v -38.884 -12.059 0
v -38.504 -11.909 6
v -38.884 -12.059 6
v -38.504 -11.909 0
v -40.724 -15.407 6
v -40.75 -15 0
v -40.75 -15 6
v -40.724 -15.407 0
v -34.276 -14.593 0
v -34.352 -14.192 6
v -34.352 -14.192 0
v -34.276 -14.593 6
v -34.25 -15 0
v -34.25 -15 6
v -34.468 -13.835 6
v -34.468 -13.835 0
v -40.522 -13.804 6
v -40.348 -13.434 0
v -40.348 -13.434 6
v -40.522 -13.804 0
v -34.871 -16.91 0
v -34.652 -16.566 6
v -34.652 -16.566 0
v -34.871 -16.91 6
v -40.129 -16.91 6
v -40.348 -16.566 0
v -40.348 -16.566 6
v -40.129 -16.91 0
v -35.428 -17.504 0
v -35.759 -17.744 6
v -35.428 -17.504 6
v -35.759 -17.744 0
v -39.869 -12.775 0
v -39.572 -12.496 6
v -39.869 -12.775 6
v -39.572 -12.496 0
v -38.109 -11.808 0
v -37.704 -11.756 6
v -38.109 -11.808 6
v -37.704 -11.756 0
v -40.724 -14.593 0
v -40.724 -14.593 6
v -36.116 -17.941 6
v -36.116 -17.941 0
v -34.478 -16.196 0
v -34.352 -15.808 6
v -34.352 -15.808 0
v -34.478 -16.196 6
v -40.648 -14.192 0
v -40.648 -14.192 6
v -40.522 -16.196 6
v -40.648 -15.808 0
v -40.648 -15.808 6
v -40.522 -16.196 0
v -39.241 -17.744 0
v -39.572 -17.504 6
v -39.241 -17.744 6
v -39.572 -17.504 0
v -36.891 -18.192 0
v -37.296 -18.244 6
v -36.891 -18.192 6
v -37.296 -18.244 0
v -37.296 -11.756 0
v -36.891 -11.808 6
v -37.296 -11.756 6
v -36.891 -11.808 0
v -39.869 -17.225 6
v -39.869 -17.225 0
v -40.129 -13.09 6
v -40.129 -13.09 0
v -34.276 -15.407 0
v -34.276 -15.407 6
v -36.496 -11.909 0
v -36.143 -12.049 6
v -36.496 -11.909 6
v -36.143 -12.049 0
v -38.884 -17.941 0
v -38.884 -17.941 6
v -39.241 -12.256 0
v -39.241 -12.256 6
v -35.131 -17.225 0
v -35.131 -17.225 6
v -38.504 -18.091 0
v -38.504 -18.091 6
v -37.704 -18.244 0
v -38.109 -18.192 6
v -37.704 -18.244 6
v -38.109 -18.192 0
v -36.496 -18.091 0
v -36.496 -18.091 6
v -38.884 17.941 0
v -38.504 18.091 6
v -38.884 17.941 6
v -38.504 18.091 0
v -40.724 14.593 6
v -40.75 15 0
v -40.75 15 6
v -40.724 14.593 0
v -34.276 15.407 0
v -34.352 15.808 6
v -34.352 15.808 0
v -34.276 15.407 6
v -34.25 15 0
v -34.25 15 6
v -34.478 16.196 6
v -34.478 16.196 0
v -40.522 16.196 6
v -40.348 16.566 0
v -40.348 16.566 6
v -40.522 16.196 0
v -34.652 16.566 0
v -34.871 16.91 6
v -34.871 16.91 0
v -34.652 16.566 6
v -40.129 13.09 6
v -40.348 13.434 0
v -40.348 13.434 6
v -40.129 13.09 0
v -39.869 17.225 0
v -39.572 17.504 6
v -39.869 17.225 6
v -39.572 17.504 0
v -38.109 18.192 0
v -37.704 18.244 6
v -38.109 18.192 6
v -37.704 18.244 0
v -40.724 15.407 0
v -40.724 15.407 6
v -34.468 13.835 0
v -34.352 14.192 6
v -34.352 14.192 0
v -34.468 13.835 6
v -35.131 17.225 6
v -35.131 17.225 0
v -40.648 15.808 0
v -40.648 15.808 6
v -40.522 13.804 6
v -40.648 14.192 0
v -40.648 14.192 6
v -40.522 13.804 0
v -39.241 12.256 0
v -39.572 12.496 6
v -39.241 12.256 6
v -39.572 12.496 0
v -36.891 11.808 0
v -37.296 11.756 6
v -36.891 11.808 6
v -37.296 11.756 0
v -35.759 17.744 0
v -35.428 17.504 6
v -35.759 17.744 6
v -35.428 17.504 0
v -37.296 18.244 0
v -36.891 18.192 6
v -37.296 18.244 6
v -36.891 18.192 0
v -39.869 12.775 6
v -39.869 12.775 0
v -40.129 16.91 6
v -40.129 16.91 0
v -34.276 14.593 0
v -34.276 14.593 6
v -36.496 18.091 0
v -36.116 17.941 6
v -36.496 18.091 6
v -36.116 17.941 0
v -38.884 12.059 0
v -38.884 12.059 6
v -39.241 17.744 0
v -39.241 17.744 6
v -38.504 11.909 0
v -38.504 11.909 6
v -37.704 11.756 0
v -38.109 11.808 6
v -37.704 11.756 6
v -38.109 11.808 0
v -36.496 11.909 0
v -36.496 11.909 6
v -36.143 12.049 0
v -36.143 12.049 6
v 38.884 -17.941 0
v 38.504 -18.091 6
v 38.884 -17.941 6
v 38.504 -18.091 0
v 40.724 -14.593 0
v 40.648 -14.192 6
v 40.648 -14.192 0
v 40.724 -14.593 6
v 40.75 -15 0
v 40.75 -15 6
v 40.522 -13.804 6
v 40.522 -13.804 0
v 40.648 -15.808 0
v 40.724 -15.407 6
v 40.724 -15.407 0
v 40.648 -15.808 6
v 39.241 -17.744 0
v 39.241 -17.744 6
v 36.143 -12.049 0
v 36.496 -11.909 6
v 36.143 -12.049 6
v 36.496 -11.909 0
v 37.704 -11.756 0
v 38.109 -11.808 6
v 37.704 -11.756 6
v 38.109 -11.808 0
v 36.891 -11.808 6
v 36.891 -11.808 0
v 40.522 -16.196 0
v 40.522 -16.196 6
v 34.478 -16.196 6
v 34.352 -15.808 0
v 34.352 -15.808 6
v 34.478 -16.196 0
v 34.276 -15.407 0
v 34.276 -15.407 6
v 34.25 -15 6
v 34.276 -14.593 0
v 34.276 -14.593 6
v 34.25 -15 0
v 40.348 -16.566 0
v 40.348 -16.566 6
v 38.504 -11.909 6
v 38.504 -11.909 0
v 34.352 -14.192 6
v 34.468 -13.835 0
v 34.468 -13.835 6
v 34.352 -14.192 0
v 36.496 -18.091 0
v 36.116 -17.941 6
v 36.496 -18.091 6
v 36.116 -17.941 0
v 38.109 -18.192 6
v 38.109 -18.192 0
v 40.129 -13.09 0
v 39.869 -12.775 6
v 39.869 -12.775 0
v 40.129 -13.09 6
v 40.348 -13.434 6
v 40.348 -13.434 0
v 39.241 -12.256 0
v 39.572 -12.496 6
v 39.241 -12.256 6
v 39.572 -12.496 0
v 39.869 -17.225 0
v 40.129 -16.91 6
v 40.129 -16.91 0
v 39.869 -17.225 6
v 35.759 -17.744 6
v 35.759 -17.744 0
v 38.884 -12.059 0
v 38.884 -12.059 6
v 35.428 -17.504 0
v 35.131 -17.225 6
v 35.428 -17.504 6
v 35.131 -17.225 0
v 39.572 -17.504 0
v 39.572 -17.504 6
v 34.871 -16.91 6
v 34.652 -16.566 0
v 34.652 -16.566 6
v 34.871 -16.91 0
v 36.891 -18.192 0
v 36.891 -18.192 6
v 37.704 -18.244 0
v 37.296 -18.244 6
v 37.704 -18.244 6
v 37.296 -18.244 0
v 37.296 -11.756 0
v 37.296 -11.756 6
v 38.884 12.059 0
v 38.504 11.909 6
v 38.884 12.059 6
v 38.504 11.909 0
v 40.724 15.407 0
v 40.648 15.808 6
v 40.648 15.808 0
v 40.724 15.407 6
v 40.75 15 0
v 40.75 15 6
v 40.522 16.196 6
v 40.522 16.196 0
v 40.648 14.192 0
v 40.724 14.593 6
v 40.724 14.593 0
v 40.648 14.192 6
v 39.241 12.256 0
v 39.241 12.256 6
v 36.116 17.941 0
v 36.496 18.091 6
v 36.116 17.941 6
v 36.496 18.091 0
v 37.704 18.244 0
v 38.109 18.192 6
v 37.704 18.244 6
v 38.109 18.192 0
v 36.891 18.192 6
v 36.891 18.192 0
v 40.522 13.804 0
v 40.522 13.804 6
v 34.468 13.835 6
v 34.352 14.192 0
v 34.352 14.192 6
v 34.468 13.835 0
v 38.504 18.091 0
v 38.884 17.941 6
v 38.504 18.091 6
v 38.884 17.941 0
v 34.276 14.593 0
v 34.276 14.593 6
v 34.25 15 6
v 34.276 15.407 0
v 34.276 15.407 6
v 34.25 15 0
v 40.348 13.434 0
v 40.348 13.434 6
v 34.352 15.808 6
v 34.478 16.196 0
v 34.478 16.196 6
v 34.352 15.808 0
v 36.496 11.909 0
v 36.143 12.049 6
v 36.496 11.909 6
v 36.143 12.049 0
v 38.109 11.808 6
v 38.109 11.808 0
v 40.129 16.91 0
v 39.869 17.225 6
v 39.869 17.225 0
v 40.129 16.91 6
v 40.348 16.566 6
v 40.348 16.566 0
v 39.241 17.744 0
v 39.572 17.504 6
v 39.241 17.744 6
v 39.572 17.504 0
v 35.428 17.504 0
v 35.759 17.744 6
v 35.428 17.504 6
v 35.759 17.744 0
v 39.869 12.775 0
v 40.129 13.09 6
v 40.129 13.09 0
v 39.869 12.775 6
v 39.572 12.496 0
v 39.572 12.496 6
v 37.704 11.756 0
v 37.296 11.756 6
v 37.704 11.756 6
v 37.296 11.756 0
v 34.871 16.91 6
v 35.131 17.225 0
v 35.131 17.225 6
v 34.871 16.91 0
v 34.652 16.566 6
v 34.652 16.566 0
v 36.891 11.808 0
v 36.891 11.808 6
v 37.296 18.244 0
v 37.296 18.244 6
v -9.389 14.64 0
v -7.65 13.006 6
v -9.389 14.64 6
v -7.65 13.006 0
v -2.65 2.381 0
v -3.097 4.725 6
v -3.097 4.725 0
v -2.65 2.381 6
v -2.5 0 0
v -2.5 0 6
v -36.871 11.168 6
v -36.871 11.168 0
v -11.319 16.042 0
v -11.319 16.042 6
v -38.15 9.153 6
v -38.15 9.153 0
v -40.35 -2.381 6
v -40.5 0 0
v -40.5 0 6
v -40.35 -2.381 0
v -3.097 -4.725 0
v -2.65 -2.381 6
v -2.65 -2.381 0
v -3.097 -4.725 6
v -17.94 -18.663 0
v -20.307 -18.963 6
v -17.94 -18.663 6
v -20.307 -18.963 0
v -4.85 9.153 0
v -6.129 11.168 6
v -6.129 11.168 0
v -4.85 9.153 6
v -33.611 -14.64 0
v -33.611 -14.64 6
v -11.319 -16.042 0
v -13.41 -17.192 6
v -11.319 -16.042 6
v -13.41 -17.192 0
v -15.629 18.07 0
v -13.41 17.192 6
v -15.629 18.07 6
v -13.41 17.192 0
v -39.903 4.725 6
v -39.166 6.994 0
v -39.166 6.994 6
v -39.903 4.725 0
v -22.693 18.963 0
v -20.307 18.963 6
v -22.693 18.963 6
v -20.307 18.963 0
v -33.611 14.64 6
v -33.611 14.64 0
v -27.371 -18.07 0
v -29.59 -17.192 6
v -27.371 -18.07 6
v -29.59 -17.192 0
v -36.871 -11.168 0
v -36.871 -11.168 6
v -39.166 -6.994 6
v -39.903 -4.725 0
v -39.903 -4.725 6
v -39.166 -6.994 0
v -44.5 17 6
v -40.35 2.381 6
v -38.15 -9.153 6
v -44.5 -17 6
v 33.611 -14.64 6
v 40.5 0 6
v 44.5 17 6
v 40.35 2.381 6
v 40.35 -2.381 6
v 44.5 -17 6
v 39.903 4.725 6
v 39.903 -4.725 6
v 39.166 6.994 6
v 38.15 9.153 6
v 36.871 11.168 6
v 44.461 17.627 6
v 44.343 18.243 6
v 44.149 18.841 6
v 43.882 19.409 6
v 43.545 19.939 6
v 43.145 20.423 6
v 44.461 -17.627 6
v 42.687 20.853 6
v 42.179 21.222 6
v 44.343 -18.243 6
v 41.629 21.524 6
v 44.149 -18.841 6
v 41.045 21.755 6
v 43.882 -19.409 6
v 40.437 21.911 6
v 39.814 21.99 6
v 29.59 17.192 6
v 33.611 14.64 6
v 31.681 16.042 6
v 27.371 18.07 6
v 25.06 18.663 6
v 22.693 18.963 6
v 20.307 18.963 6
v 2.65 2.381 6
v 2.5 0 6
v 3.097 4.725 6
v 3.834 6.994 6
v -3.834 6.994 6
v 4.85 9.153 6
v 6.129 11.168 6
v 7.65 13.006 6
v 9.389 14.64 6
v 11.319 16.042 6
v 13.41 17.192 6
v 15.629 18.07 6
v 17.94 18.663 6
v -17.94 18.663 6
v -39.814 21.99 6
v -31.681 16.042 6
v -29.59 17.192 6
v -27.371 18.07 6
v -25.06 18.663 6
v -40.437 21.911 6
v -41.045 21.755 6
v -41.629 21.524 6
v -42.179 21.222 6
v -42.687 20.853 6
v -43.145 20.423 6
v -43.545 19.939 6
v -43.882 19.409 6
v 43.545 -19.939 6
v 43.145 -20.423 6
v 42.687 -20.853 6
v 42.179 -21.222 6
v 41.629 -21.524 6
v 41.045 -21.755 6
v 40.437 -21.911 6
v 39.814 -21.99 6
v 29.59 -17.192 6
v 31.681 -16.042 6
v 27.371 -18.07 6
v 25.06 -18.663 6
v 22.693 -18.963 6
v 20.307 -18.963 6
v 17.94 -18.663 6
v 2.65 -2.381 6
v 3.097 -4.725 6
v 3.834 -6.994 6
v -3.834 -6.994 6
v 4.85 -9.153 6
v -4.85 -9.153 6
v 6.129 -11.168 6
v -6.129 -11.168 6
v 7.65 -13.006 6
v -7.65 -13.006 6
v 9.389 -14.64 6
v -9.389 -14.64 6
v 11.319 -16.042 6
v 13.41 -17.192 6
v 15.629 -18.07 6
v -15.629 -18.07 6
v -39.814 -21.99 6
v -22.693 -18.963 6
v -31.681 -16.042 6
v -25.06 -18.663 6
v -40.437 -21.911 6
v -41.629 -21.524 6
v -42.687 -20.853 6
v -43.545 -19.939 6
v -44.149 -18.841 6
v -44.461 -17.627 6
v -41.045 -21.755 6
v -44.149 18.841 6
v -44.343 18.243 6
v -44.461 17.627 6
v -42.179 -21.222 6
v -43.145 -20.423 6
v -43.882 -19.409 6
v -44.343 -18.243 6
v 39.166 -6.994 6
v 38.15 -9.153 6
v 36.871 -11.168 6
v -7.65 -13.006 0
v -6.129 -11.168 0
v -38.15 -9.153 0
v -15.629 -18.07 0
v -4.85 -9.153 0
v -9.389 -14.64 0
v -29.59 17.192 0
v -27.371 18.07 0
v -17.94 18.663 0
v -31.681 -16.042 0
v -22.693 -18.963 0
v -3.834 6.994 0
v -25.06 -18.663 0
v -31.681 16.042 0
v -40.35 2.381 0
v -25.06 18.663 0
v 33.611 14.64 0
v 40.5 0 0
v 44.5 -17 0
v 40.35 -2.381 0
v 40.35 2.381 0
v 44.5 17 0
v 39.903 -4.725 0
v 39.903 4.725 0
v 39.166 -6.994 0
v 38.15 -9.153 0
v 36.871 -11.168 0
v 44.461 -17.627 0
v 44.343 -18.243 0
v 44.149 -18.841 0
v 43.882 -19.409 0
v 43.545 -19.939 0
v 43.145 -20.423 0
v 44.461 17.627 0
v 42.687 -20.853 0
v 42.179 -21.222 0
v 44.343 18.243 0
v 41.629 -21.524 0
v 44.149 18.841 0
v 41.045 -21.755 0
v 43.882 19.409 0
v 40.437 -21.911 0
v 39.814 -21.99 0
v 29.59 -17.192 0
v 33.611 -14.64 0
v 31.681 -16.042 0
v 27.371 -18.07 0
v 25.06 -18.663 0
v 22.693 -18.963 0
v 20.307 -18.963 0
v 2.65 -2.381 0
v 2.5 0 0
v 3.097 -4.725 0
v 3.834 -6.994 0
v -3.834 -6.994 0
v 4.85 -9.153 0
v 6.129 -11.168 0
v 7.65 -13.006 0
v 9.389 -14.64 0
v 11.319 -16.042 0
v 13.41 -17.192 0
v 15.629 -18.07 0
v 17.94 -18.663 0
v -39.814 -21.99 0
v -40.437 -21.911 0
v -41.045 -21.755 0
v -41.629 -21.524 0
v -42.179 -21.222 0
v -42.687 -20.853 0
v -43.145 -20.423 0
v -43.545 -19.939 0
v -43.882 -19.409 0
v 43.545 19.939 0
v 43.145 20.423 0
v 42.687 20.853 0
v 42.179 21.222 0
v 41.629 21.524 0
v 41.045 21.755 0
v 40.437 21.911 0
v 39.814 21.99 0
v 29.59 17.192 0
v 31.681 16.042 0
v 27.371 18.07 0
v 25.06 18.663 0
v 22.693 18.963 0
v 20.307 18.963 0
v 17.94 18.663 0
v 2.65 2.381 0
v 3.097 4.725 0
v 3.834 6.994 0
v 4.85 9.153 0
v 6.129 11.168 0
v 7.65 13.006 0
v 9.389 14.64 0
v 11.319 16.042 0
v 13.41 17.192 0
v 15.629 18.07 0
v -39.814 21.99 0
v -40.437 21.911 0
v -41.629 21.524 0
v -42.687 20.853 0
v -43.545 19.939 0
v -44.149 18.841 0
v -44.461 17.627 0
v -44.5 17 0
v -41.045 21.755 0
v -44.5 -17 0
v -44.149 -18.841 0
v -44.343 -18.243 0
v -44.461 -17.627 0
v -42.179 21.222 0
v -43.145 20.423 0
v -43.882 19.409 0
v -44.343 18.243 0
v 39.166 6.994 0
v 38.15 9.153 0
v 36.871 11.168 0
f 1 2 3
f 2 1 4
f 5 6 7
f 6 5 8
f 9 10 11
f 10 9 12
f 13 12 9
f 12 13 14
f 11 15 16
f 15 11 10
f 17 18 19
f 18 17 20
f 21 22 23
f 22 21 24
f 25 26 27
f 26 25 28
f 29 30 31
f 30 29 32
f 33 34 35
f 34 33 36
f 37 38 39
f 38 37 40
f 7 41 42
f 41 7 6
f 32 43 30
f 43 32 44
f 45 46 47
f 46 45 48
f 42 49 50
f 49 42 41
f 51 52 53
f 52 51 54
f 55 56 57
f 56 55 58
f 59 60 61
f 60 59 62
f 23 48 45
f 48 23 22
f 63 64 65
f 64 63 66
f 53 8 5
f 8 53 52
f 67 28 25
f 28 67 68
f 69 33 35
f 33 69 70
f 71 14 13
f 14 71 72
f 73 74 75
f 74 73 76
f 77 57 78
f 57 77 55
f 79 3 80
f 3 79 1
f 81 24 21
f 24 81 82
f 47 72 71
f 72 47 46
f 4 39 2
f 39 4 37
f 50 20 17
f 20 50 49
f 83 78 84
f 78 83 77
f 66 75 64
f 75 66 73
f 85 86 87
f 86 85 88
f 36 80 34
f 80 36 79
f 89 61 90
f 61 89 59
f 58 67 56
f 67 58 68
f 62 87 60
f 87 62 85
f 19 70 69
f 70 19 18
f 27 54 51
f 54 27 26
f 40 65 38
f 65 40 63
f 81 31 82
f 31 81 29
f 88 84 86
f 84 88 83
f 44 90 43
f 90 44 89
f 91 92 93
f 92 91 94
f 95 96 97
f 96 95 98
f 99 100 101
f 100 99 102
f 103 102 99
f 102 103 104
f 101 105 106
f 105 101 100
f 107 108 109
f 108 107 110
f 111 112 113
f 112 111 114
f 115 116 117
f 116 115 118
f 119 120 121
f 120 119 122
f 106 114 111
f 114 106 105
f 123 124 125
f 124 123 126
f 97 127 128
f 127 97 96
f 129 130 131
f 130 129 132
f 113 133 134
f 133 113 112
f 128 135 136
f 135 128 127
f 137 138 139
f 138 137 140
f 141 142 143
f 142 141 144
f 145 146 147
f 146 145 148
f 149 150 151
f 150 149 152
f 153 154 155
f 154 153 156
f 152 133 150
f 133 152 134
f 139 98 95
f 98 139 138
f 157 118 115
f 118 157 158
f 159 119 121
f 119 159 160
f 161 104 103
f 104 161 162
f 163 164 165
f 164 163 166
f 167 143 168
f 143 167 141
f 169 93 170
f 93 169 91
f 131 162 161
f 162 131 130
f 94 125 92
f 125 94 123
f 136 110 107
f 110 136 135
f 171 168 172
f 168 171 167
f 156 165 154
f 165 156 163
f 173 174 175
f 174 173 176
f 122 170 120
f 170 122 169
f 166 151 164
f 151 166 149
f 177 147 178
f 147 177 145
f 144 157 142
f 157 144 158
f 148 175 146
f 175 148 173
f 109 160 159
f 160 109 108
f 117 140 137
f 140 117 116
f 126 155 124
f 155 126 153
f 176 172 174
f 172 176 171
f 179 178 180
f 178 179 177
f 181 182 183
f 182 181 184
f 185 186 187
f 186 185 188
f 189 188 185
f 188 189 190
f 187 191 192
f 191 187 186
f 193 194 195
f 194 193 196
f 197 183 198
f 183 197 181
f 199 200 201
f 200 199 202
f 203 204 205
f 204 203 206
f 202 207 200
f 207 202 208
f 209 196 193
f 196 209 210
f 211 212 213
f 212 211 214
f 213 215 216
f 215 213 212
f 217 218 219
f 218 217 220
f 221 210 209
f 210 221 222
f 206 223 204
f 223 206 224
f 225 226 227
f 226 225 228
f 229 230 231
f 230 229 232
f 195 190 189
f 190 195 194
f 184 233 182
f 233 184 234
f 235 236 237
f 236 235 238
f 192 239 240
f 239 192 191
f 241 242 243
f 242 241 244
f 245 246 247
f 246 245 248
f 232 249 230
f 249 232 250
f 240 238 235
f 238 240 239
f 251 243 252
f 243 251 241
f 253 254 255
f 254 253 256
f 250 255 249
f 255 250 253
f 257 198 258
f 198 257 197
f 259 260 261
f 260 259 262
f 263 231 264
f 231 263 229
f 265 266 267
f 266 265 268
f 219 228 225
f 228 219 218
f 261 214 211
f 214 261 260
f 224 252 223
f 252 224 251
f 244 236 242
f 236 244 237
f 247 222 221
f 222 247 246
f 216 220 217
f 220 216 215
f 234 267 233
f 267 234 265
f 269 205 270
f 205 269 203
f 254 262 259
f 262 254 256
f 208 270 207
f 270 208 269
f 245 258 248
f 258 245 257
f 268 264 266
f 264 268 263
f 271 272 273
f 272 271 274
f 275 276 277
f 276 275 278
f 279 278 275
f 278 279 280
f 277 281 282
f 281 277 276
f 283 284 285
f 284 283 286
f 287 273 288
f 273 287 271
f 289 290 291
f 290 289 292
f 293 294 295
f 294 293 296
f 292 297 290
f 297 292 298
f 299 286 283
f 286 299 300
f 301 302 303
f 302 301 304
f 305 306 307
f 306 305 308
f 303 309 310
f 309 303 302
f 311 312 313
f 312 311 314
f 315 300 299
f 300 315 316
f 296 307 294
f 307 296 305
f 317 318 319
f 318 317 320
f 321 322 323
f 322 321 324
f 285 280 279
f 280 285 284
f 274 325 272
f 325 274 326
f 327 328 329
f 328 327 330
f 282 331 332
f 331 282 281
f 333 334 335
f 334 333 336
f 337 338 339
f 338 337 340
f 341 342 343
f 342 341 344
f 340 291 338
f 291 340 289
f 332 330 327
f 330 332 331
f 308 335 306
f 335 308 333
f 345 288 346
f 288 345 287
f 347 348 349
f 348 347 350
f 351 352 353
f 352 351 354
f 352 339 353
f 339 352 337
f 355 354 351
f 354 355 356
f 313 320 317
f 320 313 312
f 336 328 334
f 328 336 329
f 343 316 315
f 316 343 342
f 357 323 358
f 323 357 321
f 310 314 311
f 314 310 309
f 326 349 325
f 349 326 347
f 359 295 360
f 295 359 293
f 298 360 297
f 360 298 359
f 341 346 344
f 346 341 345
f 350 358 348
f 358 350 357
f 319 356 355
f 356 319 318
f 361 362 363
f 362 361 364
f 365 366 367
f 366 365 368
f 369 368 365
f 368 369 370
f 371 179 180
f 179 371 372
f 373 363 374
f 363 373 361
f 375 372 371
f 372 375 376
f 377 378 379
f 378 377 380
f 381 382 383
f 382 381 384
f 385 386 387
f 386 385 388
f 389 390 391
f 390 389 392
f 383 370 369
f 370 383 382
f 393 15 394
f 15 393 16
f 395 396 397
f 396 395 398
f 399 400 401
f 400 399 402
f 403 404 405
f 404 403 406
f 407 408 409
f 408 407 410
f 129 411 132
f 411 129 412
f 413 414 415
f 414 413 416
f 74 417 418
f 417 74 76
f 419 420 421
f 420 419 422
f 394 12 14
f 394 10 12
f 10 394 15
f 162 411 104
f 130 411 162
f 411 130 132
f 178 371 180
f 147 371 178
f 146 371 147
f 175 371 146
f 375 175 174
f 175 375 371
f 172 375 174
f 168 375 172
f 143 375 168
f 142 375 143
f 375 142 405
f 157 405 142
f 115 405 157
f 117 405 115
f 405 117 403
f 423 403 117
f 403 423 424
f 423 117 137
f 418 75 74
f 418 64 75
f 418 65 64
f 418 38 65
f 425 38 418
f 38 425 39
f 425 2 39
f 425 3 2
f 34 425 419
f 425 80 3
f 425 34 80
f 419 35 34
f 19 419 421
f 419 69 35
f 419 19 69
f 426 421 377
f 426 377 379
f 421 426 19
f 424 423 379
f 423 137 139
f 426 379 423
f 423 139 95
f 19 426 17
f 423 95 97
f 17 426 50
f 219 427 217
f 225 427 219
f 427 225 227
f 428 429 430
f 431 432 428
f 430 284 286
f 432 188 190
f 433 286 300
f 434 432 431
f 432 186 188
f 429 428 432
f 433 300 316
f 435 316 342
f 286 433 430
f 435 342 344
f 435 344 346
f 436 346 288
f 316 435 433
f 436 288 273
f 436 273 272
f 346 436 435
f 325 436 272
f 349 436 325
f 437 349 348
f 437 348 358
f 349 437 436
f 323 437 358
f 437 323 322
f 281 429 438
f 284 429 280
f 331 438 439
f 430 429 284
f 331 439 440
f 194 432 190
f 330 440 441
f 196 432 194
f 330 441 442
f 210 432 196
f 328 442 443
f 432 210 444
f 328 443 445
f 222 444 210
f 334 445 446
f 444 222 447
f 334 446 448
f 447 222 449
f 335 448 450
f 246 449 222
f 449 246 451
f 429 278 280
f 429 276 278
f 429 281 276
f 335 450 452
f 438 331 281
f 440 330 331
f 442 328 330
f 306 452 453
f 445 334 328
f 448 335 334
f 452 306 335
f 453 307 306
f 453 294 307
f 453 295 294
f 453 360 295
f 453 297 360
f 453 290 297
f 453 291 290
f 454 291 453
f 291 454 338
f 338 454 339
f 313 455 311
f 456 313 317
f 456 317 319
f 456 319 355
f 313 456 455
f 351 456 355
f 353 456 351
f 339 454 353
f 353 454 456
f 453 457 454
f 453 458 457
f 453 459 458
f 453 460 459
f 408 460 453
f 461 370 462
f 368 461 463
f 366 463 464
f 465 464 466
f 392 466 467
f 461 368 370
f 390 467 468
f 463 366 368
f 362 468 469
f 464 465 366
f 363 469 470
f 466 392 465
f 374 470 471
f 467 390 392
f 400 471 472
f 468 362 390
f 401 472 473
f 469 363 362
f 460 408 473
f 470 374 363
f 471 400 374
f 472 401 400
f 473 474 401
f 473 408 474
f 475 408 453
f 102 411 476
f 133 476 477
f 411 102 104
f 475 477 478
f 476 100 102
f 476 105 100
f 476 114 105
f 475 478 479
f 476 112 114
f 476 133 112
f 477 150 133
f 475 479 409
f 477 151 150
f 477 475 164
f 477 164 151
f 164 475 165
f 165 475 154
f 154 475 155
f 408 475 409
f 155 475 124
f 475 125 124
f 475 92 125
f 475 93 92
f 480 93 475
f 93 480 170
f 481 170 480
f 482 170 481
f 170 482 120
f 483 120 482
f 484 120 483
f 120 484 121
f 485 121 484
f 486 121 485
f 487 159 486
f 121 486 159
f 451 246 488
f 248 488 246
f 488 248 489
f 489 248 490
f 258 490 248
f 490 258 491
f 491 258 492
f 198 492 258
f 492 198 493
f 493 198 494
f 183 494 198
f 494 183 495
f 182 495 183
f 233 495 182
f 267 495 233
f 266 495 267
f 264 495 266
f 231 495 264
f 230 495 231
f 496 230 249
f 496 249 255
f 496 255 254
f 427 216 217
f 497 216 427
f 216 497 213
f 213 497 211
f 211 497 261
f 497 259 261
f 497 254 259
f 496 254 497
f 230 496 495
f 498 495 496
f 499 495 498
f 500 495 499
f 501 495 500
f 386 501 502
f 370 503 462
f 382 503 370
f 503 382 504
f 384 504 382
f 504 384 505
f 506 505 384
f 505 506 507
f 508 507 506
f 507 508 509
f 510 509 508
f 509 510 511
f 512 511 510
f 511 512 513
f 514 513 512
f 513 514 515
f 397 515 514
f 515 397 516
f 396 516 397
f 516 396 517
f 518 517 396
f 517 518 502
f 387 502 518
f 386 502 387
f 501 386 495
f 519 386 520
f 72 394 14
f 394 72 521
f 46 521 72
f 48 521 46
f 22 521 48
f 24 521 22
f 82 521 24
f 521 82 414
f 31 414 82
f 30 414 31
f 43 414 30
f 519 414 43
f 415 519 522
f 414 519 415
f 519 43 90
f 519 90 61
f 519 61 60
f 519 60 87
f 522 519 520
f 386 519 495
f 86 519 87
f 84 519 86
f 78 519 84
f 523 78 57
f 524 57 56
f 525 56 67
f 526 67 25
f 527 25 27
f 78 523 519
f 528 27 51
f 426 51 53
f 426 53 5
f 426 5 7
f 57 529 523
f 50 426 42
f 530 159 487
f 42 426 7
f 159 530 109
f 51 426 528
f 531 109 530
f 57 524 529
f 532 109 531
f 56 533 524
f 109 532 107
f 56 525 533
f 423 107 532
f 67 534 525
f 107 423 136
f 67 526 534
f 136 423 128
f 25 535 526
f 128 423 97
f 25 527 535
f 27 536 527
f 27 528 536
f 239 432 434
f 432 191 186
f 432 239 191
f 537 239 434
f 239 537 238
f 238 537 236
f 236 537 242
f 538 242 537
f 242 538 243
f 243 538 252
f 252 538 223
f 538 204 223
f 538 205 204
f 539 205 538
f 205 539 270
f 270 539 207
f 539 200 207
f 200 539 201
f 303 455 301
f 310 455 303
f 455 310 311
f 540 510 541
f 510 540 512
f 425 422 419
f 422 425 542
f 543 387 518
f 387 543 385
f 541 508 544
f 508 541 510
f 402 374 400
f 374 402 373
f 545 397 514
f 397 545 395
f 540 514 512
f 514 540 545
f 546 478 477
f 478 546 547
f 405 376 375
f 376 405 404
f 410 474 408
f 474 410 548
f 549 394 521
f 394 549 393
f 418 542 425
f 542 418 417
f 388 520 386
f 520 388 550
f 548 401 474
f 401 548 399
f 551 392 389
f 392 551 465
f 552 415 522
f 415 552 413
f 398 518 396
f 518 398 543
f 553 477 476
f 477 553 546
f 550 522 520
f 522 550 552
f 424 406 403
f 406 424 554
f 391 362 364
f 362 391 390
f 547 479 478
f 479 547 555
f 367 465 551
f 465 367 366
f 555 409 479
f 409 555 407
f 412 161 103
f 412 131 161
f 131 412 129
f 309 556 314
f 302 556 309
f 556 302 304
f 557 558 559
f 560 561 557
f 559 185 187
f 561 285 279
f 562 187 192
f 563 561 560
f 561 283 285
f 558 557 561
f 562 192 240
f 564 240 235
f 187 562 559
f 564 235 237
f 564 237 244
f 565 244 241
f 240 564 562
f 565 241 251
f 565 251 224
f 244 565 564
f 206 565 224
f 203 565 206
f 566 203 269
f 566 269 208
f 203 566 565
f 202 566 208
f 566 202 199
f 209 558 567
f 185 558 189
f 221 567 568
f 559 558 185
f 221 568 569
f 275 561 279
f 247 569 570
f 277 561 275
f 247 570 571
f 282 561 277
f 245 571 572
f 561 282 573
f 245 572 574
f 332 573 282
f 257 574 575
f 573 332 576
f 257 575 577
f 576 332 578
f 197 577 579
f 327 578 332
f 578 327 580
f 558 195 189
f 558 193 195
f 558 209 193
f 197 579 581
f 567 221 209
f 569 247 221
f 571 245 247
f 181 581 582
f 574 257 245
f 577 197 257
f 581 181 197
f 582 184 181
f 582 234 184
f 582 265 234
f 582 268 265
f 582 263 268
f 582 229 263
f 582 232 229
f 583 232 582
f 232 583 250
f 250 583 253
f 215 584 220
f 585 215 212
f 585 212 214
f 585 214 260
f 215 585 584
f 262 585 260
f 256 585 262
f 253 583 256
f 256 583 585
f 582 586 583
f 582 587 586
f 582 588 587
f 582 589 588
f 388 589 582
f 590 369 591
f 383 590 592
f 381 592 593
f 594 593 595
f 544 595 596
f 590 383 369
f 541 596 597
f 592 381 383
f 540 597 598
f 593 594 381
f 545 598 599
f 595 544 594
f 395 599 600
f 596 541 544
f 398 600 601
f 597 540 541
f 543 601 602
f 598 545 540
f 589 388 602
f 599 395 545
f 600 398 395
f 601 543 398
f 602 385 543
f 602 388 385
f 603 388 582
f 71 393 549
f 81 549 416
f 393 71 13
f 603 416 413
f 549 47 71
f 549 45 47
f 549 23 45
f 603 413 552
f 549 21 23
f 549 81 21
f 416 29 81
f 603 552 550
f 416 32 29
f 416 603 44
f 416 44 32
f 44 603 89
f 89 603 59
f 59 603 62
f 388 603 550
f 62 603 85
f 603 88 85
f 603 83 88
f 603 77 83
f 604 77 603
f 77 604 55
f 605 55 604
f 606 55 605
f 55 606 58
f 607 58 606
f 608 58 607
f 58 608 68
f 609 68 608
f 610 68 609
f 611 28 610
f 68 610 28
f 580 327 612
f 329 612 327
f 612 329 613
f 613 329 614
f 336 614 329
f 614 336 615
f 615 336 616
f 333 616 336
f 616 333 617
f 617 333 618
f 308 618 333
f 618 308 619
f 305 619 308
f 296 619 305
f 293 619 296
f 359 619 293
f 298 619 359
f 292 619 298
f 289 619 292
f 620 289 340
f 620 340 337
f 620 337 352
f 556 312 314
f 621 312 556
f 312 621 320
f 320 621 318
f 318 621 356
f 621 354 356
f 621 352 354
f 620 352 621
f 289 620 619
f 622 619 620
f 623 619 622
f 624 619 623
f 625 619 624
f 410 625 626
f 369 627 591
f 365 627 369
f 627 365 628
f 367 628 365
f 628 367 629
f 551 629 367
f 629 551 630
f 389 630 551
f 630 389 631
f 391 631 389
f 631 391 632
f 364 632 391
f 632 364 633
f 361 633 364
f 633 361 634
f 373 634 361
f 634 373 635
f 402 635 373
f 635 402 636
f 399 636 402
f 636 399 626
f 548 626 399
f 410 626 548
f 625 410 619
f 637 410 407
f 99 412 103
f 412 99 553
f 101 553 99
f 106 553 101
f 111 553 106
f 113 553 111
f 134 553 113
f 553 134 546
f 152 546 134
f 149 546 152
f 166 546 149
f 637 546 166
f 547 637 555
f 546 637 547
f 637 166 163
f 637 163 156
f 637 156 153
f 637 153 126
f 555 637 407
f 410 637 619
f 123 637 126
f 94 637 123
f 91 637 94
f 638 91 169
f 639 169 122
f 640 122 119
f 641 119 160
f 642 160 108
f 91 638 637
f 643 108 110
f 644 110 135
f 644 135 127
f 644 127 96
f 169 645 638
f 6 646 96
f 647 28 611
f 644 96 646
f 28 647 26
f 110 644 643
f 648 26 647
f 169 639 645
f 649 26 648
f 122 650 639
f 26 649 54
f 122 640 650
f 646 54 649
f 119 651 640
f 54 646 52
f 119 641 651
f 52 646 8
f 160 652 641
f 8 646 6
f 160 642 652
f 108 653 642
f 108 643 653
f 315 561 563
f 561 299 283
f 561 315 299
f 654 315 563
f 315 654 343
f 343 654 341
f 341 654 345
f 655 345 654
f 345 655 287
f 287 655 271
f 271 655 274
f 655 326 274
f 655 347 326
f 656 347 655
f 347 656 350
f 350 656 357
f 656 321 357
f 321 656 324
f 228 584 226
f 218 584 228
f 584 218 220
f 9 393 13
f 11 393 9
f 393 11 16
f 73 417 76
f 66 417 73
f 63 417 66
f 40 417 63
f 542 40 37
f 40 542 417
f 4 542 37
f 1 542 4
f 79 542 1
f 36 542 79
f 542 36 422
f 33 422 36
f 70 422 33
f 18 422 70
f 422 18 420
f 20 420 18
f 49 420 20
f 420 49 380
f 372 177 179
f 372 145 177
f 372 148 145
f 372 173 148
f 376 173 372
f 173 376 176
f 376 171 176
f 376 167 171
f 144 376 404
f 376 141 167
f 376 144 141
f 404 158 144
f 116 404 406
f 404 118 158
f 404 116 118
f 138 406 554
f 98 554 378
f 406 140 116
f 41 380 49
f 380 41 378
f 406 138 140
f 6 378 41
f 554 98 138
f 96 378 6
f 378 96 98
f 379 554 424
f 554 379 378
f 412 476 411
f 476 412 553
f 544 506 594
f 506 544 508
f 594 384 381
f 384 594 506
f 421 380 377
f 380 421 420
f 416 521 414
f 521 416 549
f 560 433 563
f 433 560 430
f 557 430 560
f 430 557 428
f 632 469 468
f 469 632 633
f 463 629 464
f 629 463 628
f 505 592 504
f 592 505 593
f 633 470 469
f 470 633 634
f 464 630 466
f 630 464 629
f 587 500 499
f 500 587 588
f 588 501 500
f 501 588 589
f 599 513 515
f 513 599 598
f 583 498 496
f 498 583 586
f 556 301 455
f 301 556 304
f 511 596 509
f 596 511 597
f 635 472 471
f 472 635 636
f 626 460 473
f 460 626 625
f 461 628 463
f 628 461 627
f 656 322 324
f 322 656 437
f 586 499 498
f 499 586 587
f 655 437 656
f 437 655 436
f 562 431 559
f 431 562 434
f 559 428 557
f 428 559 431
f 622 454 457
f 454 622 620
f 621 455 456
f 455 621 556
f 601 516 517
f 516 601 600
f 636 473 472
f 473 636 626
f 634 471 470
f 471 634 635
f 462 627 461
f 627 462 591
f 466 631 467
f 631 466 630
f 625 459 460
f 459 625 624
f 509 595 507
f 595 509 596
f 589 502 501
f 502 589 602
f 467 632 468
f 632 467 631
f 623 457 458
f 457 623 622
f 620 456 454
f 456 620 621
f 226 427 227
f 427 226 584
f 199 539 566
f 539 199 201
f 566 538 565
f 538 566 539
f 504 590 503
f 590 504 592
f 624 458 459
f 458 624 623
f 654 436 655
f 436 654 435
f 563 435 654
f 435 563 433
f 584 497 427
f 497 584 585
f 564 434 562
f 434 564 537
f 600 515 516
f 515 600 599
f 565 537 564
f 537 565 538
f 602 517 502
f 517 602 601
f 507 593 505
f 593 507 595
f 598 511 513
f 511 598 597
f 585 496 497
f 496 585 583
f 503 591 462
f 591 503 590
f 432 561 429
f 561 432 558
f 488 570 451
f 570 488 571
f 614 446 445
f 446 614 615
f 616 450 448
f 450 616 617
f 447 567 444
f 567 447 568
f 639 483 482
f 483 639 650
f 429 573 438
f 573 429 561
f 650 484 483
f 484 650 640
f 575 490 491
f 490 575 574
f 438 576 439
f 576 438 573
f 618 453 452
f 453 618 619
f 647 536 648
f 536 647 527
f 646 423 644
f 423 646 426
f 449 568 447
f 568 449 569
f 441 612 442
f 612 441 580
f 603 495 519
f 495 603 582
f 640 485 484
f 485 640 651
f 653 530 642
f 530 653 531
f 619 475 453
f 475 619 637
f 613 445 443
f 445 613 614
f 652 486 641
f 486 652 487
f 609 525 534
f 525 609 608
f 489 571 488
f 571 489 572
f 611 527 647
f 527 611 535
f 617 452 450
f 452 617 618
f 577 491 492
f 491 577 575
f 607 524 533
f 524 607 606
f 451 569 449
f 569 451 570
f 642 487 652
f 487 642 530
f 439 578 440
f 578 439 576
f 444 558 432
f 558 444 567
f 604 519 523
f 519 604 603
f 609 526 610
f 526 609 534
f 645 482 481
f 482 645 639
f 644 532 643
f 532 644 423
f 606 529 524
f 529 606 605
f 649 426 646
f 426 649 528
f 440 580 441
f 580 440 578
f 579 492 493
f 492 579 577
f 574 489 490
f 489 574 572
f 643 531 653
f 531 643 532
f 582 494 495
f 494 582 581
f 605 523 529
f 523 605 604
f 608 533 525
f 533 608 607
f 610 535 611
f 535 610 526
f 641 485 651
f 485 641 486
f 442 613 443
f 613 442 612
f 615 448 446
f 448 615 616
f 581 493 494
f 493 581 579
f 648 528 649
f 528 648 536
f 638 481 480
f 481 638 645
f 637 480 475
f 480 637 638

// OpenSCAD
$fn = 50;


difference() {
	union() {
		hull() {
			translate(v = [-39.5000000000, 17.0000000000, 0]) {
				cylinder(h = 6, r = 5);
			}
			translate(v = [39.5000000000, 17.0000000000, 0]) {
				cylinder(h = 6, r = 5);
			}
			translate(v = [-39.5000000000, -17.0000000000, 0]) {
				cylinder(h = 6, r = 5);
			}
			translate(v = [39.5000000000, -17.0000000000, 0]) {
				cylinder(h = 6, r = 5);
			}
		}
	}
	union() {
		#translate(v = [-37.5000000000, -15.0000000000, -100.0000000000]) {
			cylinder(h = 200, r = 3.2500000000);
		}
		#translate(v = [-37.5000000000, 15.0000000000, -100.0000000000]) {
			cylinder(h = 200, r = 3.2500000000);
		}
		#translate(v = [37.5000000000, -15.0000000000, -100.0000000000]) {
			cylinder(h = 200, r = 3.2500000000);
		}
		#translate(v = [37.5000000000, 15.0000000000, -100.0000000000]) {
			cylinder(h = 200, r = 3.2500000000);
		}
		#translate(v = [-21.5000000000, 0, 0]) {
			cylinder(h = 6, r = 19.0000000000);
		}
		#translate(v = [21.5000000000, 0, 0]) {
			cylinder(h = 6, r = 19.0000000000);
		}
	}
}
